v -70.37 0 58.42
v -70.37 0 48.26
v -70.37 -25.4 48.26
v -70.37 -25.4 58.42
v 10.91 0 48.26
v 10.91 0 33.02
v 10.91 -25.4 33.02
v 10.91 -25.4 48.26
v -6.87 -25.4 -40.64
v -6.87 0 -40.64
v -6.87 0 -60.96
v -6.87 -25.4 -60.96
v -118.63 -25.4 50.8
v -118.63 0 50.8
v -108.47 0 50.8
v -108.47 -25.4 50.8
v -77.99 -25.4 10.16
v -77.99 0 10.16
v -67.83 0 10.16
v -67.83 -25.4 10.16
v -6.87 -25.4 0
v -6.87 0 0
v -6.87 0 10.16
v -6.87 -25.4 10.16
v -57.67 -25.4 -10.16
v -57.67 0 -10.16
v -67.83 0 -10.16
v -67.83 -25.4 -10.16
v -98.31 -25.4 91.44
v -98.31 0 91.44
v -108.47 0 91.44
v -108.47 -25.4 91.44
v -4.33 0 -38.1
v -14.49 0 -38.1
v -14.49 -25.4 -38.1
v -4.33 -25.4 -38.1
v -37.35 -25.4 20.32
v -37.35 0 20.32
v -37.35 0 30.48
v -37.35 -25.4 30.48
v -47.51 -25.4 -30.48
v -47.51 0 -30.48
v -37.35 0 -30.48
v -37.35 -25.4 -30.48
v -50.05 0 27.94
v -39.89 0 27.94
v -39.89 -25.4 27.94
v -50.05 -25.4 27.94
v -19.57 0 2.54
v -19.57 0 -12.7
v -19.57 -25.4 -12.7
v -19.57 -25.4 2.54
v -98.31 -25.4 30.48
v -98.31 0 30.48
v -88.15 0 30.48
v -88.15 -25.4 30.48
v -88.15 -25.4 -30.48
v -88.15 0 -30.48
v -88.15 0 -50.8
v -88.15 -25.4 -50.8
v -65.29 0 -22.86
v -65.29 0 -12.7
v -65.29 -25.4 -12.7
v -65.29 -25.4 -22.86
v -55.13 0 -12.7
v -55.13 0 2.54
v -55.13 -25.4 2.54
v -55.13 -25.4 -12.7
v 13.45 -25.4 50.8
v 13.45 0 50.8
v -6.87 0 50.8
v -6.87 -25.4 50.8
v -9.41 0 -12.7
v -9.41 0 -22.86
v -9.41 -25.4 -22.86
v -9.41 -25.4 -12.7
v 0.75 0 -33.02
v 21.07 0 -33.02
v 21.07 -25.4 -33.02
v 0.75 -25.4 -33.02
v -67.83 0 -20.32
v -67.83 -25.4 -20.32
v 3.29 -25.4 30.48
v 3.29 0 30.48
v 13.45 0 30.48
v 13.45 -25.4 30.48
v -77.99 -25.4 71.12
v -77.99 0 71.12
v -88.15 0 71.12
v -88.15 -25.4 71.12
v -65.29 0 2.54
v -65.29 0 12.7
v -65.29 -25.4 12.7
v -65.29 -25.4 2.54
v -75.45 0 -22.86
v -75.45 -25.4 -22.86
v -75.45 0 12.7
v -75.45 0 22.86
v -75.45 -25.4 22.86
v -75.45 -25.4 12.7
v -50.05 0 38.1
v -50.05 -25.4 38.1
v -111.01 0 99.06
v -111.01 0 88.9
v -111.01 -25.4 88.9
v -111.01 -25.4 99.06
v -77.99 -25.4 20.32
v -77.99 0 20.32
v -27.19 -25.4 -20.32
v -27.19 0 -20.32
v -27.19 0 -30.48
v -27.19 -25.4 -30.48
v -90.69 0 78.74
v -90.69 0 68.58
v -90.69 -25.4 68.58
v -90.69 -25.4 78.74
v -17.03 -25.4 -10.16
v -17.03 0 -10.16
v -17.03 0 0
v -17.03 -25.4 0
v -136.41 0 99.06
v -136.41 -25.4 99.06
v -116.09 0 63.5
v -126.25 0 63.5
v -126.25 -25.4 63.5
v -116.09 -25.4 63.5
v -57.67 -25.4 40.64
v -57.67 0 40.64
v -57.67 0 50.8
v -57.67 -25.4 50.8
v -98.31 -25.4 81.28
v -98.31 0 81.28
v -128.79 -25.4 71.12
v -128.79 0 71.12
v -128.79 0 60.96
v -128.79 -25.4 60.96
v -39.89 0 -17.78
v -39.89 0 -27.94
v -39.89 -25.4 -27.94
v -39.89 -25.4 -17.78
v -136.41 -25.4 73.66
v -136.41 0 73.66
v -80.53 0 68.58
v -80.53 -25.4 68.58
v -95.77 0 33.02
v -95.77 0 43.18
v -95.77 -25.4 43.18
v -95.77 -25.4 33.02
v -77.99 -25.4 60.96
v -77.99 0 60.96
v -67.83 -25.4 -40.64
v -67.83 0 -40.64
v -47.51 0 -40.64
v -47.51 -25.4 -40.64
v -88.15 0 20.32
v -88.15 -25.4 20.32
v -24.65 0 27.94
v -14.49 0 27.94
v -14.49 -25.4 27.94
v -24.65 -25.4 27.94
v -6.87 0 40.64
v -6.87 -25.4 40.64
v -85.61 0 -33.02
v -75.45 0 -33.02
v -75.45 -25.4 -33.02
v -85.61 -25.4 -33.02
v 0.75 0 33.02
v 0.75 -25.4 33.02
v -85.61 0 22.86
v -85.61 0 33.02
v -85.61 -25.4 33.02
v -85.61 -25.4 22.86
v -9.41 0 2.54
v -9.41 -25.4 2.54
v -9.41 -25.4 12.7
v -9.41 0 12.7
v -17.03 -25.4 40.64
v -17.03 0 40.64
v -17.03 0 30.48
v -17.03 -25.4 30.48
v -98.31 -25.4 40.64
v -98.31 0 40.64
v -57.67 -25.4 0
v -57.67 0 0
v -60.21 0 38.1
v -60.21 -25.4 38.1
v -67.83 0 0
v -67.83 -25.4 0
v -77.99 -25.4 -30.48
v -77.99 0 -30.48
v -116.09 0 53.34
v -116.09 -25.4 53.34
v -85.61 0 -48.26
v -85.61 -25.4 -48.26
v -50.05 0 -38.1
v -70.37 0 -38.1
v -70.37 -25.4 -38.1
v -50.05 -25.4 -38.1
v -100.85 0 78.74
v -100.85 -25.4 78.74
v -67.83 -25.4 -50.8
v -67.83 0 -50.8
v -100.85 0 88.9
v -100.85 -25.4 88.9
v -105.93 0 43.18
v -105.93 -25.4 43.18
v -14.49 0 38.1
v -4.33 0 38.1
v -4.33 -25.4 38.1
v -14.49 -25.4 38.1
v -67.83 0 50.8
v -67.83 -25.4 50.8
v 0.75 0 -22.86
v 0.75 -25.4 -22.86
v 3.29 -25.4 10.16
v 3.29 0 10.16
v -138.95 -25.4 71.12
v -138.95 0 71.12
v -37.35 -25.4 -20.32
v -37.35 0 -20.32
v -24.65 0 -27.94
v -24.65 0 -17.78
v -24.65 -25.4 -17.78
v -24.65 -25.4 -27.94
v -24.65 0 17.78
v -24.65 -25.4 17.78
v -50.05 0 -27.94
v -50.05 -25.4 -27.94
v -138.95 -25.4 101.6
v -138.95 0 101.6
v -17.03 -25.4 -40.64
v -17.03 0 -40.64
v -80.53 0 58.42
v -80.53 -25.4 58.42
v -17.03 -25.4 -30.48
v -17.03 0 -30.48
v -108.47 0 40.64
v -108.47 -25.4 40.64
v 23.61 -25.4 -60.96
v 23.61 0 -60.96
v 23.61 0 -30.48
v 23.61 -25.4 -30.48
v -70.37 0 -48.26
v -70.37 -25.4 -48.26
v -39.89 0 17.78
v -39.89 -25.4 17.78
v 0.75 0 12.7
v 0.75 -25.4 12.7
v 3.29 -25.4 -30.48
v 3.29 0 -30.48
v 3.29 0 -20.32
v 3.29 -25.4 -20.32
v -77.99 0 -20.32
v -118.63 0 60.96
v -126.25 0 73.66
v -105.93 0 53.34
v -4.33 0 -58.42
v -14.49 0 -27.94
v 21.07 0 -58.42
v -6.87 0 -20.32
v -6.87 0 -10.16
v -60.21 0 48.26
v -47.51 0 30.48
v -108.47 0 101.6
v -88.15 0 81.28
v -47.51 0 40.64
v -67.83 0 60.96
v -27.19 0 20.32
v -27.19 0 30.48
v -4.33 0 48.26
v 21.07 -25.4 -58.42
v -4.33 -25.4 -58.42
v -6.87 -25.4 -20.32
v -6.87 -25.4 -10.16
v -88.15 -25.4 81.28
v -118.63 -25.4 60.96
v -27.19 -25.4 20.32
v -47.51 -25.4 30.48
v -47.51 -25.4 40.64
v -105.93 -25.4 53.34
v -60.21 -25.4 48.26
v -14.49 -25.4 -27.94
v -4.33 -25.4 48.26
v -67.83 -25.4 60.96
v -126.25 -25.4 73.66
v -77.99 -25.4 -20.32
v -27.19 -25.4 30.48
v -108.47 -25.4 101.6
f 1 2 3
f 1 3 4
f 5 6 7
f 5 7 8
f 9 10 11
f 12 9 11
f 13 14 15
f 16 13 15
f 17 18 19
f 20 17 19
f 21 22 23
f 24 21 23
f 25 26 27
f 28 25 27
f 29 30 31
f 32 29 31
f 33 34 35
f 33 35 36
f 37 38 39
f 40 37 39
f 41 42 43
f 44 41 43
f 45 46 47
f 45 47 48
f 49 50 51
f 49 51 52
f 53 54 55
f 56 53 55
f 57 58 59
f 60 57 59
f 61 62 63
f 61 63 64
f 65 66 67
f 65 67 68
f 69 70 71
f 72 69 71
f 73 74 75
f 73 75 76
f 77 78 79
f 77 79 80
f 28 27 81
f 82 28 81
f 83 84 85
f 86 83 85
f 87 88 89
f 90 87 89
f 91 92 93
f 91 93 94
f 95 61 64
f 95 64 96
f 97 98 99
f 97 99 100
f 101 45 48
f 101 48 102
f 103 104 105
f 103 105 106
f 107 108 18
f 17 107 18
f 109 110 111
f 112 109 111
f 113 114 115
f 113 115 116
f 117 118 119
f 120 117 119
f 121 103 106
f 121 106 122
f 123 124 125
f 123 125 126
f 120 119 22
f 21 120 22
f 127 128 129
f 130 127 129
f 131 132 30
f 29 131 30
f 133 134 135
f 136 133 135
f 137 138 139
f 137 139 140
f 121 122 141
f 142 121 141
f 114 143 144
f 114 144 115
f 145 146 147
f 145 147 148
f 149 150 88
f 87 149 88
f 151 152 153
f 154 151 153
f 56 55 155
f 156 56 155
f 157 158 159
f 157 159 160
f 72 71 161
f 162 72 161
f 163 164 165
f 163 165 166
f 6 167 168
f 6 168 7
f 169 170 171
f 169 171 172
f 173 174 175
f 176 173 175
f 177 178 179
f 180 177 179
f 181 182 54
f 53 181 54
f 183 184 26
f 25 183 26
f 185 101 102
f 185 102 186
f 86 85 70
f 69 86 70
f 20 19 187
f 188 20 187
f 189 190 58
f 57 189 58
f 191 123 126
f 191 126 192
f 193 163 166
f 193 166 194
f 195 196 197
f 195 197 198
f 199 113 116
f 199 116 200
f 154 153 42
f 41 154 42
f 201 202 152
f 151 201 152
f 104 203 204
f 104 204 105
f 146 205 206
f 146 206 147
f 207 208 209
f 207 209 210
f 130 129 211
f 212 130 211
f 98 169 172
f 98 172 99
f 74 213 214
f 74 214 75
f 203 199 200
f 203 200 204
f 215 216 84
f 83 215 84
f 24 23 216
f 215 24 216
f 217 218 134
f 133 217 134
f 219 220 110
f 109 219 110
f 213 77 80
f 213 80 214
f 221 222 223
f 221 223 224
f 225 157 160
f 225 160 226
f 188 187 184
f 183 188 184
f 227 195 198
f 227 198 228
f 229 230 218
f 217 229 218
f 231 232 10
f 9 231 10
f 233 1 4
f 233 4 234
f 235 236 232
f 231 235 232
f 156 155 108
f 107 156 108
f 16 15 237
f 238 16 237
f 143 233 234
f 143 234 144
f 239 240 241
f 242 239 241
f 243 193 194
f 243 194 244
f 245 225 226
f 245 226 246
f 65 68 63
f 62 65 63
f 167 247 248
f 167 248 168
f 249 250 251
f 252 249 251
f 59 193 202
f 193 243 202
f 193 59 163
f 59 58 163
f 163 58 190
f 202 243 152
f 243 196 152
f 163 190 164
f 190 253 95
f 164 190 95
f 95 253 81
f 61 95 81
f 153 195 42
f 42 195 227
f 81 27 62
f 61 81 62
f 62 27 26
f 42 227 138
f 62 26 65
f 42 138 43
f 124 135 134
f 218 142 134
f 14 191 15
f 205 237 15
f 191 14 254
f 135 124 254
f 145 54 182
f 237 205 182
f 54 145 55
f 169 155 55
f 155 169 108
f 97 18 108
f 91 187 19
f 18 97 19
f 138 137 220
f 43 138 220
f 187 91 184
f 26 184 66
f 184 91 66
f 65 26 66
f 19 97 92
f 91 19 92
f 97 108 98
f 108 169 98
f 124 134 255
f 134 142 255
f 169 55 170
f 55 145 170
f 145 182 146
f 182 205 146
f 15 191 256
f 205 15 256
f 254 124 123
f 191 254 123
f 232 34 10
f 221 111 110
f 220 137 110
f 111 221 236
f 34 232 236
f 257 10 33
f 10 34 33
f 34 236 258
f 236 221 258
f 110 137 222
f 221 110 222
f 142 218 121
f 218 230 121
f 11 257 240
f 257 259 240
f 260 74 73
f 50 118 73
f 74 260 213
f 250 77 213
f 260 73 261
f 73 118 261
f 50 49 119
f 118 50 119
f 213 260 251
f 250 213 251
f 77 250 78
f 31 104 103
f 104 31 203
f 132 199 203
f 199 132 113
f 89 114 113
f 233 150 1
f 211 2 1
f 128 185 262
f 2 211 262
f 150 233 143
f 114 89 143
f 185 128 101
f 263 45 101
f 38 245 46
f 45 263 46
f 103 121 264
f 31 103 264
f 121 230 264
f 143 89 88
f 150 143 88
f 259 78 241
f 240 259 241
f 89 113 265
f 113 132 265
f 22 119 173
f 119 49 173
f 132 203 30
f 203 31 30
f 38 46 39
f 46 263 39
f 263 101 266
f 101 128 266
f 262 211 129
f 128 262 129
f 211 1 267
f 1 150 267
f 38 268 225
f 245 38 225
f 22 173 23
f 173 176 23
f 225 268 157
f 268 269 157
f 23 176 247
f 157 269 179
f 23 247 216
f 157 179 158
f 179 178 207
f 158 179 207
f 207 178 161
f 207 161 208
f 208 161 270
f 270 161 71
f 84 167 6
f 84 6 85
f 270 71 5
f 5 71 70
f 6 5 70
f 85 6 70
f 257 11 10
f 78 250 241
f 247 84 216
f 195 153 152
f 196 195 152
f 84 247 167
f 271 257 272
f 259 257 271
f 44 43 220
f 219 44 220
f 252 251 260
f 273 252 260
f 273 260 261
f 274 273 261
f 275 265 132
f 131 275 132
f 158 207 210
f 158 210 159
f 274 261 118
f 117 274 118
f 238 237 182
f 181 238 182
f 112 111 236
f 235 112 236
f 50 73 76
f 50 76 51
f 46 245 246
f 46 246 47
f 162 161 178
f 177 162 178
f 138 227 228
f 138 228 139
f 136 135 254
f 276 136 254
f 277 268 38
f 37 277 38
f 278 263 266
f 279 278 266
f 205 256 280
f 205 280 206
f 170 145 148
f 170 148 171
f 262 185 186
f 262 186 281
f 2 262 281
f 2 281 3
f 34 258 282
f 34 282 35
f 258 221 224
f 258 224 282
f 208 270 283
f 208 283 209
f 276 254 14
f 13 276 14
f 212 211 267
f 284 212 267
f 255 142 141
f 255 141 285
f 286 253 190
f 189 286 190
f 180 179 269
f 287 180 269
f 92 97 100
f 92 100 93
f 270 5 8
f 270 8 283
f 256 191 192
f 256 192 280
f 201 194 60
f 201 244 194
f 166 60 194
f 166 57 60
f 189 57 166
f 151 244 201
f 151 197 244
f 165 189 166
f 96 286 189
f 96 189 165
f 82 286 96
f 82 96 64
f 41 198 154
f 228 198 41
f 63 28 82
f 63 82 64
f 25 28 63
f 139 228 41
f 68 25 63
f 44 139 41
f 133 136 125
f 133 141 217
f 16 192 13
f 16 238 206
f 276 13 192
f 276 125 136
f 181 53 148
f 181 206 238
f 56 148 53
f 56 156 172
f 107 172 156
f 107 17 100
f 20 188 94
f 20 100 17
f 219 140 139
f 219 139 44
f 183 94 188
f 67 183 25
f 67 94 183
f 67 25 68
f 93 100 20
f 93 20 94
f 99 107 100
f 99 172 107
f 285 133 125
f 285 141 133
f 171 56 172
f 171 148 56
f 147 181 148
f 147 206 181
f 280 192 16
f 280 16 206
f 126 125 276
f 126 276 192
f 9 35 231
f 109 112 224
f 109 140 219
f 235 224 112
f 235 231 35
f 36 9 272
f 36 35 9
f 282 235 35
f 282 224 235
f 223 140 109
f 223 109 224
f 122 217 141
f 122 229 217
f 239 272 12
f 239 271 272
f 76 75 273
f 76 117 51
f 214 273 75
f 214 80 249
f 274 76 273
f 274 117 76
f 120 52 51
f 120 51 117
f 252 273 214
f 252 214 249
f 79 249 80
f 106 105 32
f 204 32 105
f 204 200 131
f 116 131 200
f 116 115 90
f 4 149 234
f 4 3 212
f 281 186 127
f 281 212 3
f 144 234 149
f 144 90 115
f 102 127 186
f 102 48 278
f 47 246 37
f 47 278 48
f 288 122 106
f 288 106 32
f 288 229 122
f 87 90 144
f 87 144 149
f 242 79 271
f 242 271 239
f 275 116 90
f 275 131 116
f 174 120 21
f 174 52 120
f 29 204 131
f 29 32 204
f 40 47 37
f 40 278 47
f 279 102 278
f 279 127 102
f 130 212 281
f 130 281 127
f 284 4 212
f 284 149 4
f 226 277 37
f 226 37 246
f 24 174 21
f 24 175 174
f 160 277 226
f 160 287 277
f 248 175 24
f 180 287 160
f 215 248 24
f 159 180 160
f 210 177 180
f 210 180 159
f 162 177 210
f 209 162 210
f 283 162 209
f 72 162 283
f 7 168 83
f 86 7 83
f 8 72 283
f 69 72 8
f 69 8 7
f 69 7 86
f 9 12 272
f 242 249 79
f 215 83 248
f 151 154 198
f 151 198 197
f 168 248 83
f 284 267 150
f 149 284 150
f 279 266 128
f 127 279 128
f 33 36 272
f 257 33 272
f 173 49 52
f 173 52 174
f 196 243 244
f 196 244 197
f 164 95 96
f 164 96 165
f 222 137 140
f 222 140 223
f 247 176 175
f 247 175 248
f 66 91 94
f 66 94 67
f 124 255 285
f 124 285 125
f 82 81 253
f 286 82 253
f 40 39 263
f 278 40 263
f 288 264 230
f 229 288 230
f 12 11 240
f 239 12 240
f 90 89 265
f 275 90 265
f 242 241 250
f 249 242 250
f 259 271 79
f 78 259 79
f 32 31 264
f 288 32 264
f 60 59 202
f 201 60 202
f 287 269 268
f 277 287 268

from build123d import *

# Parameters (mm, degrees)
F1_DEPTH = 25.4
F2_T     = -2.54


with BuildPart() as f1:
    # F0 (on Front) → F1 (new body)
    with BuildSketch(Plane.XZ):
        Polygon((-6.8695716643, -40.64), (-6.8695716643, -60.96), (23.6104283357, -60.96), (23.6104283357, -30.48), (3.2904283357, -30.48), (3.2904283357, -20.32), (-6.8695716643, -20.32), (-17.0295716643, -20.32), (-27.1895716643, -20.32), (-27.1895716643, -30.48), (-17.0295716643, -30.48), (-17.0295716643, -40.64), align=None)
        Polygon((-17.0295716643, -20.32), (-6.8695716643, -20.32), (-6.8695716643, -10.16), (-17.0295716643, -10.16), (-17.0295716643, 0), (-6.8695716643, 0), (-6.8695716643, 10.16), (3.2904283357, 10.16), (3.2904283357, 30.48), (13.4504283357, 30.48), (13.4504283357, 50.8), (-6.8695716643, 50.8), (-6.8695716643, 40.64), (-17.0295716643, 40.64), (-17.0295716643, 30.48), (-27.1895716643, 30.48), (-27.1895716643, 20.32), (-37.3495716643, 20.32), (-47.5095716643, 20.32), (-57.6695716643, 20.32), (-77.9895716643, 20.32), (-77.9895716643, 10.16), (-67.8295716643, 10.16), (-67.8295716643, 0), (-57.6695716643, 0), (-57.6695716643, -10.16), (-57.6695716643, -20.32), (-37.3495716643, -20.32), (-27.1895716643, -20.32), align=None)
        Polygon((-37.3495716643, -30.48), (-37.3495716643, -20.32), (-57.6695716643, -20.32), (-57.6695716643, -10.16), (-67.8295716643, -10.16), (-67.8295716643, -20.32), (-77.9895716643, -20.32), (-77.9895716643, -30.48), (-88.1495716643, -30.48), (-88.1495716643, -50.8), (-67.8295716643, -50.8), (-67.8295716643, -40.64), (-47.5095716643, -40.64), (-47.5095716643, -30.48), align=None)
        Polygon((-88.1495716643, 20.32), (-77.9895716643, 20.32), (-57.6695716643, 20.32), (-47.5095716643, 20.32), (-37.3495716643, 20.32), (-37.3495716643, 30.48), (-47.5095716643, 30.48), (-67.8295716643, 30.48), (-88.1495716643, 30.48), align=None)
        Polygon((-98.3095716643, 30.48), (-88.1495716643, 30.48), (-67.8295716643, 30.48), (-47.5095716643, 30.48), (-47.5095716643, 40.64), (-57.6695716643, 40.64), (-77.9895716643, 40.64), (-98.3095716643, 40.64), align=None)
        Polygon((-108.4695716643, 40.64), (-98.3095716643, 40.64), (-77.9895716643, 40.64), (-57.6695716643, 40.64), (-57.6695716643, 50.8), (-67.8295716643, 50.8), (-88.1495716643, 50.8), (-108.4695716643, 50.8), align=None)
        Polygon((-118.6295716643, 50.8), (-108.4695716643, 50.8), (-88.1495716643, 50.8), (-67.8295716643, 50.8), (-67.8295716643, 60.96), (-77.9895716643, 60.96), (-98.3095716643, 60.96), (-118.6295716643, 60.96), align=None)
        Polygon((-128.7895716643, 60.96), (-118.6295716643, 60.96), (-98.3095716643, 60.96), (-77.9895716643, 60.96), (-77.9895716643, 71.12), (-88.1495716643, 71.12), (-88.1495716643, 81.28), (-98.3095716643, 81.28), (-98.3095716643, 91.44), (-108.4695716643, 91.44), (-108.4695716643, 101.6), (-138.9495716643, 101.6), (-138.9495716643, 71.12), (-128.7895716643, 71.12), align=None)
    extrude(amount=F1_DEPTH)

    # F2
    f2_openings = [f1.faces().sort_by_distance(p)[0] for p in [
        (-54.908702, -25.4, 17.55913),
        (-54.908702, 0, 17.55913),
    ]]
    offset(amount=F2_T, openings=f2_openings, kind=Kind.INTERSECTION)


solid = f1.part
